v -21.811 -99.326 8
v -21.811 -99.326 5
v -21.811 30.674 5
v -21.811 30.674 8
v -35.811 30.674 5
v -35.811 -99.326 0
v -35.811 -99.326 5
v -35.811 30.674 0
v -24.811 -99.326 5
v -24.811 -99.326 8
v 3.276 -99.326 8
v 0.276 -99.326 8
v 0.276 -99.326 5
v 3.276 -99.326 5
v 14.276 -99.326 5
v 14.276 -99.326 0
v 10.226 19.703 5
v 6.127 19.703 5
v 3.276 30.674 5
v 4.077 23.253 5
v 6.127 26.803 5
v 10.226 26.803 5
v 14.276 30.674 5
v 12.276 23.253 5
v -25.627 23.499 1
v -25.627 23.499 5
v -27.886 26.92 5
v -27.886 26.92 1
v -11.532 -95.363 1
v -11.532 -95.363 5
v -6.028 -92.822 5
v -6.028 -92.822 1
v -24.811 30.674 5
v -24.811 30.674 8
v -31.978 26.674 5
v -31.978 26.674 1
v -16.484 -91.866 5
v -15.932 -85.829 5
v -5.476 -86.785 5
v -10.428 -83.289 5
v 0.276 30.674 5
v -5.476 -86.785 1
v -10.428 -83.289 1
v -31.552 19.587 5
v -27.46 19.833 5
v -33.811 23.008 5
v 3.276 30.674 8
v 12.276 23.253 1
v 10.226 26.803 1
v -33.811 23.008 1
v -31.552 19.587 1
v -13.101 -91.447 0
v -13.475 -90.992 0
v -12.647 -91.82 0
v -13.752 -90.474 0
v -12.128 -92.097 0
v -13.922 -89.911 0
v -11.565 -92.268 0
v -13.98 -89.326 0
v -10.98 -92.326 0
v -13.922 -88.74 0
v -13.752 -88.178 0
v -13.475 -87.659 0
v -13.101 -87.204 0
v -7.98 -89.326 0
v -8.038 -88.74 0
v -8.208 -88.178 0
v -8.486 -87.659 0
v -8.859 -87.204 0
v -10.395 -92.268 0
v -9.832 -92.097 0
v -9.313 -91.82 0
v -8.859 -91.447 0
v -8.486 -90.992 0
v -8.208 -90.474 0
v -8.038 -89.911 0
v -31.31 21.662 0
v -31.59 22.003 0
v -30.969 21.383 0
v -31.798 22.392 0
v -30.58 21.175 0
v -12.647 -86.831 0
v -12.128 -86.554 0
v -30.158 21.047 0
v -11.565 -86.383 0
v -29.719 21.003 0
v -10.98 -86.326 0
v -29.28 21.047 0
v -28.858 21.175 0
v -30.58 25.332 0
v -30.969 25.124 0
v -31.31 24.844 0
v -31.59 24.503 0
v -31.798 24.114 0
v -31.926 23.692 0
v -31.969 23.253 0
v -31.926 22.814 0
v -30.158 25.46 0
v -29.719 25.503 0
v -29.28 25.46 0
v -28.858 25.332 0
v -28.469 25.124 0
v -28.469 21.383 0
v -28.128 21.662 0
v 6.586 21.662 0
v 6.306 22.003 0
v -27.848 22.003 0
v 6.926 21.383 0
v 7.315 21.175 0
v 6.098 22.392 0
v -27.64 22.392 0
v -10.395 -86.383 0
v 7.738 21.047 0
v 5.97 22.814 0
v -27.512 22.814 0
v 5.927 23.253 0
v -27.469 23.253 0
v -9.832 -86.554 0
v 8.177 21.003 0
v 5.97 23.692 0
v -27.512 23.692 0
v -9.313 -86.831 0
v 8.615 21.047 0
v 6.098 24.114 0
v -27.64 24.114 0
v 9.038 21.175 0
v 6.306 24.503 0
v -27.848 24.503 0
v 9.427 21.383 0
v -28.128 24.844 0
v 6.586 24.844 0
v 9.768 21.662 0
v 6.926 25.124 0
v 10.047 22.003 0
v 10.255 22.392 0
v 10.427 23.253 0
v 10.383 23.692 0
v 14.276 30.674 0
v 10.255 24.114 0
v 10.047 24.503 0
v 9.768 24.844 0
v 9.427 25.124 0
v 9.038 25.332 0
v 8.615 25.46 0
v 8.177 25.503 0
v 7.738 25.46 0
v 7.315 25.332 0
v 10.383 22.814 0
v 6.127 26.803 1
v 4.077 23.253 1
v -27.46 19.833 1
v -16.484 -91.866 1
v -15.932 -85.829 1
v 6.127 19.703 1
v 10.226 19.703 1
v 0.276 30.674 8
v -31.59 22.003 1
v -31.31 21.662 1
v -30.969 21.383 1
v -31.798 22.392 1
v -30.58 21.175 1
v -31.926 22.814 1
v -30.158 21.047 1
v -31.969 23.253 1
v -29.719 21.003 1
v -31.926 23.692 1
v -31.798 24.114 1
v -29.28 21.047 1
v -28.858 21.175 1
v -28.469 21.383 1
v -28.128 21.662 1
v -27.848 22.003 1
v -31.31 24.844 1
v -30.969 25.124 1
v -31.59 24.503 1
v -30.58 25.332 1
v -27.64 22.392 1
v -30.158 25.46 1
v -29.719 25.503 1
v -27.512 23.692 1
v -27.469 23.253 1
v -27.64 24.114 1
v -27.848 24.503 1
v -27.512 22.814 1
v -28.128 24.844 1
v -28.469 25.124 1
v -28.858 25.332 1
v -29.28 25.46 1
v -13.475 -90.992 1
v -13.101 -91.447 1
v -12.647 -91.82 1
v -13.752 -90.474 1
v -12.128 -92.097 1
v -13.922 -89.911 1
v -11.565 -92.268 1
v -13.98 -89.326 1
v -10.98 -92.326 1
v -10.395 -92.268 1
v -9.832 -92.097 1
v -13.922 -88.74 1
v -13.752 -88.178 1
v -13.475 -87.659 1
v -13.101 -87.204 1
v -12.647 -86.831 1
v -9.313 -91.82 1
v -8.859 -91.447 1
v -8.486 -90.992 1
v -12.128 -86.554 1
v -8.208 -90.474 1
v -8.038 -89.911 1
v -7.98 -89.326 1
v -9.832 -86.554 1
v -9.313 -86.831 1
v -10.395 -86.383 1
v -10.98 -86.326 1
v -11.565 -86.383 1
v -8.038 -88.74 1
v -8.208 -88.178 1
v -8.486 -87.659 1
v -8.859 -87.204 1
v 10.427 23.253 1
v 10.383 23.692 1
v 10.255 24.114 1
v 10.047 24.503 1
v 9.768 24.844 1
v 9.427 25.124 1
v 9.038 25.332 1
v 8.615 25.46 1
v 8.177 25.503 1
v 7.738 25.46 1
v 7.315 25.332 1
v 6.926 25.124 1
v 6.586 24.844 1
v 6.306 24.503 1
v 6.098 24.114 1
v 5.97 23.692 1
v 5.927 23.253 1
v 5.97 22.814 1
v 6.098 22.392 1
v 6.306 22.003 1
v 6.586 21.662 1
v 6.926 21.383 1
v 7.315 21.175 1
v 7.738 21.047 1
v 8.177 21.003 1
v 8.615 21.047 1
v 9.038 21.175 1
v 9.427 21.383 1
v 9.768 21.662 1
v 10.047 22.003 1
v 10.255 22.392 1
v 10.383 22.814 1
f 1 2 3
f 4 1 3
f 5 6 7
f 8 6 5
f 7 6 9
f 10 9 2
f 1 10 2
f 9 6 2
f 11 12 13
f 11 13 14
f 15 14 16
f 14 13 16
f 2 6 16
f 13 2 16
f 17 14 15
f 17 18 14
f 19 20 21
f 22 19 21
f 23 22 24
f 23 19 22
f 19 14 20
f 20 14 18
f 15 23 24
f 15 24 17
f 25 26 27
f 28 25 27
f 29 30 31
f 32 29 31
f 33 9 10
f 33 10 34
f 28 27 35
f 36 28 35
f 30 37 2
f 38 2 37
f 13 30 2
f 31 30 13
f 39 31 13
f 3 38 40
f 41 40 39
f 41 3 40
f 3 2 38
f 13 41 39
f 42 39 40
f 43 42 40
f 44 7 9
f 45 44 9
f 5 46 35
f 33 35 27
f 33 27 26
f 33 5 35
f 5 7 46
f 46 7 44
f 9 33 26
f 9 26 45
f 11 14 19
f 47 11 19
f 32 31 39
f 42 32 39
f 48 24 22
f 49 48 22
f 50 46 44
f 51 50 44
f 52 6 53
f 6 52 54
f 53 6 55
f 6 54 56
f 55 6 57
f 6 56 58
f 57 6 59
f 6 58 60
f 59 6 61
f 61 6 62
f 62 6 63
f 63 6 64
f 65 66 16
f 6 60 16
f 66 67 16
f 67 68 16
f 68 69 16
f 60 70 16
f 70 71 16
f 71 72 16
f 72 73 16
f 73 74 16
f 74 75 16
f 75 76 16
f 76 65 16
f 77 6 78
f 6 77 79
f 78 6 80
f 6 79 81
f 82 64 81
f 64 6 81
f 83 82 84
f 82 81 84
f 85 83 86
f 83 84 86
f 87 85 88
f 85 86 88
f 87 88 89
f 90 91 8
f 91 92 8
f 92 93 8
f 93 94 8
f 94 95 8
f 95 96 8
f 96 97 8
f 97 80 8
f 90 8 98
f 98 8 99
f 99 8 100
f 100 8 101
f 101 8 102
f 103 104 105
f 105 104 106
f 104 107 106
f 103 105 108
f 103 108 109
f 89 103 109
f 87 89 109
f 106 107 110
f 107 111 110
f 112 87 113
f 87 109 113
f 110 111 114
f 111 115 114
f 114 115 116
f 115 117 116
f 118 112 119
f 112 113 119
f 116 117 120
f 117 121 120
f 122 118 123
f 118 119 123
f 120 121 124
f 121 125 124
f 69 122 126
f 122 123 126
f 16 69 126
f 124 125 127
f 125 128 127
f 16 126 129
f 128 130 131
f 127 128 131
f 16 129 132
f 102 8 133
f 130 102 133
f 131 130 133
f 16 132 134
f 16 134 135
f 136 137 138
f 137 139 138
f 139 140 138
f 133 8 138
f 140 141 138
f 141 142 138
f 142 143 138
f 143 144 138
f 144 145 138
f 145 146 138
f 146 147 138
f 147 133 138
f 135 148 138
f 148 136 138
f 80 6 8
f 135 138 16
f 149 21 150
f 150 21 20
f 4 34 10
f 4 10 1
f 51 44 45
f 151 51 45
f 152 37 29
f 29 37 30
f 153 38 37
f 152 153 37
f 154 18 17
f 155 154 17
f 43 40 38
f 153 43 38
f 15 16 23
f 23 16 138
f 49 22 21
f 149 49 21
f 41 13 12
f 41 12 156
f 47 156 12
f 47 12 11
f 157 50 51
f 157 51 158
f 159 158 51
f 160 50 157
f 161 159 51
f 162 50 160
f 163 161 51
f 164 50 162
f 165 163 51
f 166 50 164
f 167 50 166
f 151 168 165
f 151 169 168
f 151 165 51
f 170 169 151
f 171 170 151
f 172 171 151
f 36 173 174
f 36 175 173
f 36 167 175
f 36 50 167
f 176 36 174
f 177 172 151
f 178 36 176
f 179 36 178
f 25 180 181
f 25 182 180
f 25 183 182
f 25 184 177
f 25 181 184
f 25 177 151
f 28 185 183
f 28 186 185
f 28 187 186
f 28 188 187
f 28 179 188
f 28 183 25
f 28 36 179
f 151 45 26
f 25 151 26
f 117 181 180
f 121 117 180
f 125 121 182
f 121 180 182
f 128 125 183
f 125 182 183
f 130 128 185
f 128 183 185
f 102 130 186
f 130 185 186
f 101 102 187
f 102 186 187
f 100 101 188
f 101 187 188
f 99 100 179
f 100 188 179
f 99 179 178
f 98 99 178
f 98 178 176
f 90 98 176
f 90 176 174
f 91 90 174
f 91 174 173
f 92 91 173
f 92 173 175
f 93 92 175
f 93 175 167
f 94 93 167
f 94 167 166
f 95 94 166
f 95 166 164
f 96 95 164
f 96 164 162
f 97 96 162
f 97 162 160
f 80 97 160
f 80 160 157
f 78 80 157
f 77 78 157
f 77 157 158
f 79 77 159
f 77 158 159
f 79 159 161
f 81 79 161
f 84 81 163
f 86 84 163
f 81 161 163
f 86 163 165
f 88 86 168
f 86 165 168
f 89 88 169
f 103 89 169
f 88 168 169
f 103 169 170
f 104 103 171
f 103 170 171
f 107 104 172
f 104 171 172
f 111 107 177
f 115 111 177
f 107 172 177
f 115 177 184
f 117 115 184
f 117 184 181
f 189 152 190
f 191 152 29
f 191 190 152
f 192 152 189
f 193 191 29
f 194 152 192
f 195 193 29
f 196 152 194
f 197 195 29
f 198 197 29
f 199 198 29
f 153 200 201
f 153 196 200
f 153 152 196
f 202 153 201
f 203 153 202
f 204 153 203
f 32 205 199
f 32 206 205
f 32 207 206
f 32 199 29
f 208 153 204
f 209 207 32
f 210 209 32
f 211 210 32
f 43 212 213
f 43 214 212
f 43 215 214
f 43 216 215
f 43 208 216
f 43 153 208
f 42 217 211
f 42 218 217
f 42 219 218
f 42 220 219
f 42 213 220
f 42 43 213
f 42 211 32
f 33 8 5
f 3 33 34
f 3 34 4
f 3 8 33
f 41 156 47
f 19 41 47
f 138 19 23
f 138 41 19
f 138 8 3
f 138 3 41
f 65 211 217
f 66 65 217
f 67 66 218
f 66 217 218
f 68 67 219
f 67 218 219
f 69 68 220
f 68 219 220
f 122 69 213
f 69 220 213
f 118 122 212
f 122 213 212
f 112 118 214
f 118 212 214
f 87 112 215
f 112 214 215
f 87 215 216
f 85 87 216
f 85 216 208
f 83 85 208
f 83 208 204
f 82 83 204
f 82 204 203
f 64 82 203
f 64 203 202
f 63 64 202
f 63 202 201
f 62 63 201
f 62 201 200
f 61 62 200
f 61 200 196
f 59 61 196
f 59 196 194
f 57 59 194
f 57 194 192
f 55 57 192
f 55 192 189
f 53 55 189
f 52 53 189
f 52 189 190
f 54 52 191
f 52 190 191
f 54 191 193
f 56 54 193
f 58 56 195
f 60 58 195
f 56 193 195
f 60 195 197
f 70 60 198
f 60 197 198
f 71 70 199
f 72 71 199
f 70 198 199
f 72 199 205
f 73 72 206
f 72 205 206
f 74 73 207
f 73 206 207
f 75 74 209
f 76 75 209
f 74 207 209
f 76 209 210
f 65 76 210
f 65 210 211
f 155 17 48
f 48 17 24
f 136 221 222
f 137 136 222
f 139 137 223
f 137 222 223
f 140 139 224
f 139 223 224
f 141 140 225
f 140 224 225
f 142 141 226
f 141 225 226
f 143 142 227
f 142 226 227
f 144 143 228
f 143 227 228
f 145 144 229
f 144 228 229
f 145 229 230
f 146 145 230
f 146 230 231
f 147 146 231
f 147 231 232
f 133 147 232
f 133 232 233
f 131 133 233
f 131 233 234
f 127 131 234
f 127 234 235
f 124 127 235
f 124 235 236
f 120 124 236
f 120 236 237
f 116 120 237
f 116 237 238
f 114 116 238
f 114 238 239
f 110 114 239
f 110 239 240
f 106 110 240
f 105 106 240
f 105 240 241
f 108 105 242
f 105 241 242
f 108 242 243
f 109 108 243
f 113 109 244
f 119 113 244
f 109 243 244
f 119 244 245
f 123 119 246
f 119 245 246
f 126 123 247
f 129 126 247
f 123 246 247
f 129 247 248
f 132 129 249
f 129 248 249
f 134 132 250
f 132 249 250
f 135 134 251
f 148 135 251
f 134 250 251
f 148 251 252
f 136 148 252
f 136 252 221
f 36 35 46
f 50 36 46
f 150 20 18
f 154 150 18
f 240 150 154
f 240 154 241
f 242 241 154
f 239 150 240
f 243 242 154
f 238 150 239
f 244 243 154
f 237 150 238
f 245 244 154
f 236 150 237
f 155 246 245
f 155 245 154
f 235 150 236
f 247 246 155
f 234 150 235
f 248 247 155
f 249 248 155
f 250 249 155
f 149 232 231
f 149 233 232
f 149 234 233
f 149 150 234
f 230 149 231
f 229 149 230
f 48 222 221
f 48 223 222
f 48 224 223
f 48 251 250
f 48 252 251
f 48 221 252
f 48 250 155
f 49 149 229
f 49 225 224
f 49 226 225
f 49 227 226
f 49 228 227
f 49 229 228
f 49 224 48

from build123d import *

# Parameters (mm, degrees)
F0_W     = 50.08647
F0_H     = 130
F1_DEPTH = 5
F2_R     = 3
F2_R_2   = 2.25
F3_DEPTH = 25
F4_DEPTH = 4
F5_W     = 3
F5_H     = 130
F6_DEPTH = 3


with BuildPart() as f1:
    # F0 (on Top) → F1 (new body)
    with BuildSketch(Plane.XY):
        with Locations((-10.767537, -34.325769)):
            Rectangle(F0_W, F0_H)
    extrude(amount=F1_DEPTH)

    # F2 (on face) → F3 (cut)
    with BuildSketch(Plane.XY.offset(5)):
        with Locations((-10.980115, -89.325769)):
            Circle(F2_R)
        with Locations((8.176511, 23.25341)):
            Circle(F2_R_2)
        with Locations((-29.718949, 23.25341)):
            Circle(F2_R_2)
    extrude(amount=-F3_DEPTH, mode=Mode.SUBTRACT)

    # F2 (on face) → F4 (cut)
    with BuildSketch(Plane.XY.offset(5)):
        Polygon((10.226105, 26.80341), (6.126918, 26.80341), (4.077324, 23.25341), (6.126918, 19.70341), (10.226105, 19.70341), (12.275698, 23.25341), align=None)
        with Locations((8.176511, 23.25341)):
            Circle(F2_R_2, mode=Mode.SUBTRACT)
        Polygon((-31.977558, 26.674231), (-33.810772, 23.007808), (-31.552163, 19.586987), (-27.46034, 19.832589), (-25.627126, 23.499012), (-27.885736, 26.919834), align=None)
        with Locations((-29.718949, 23.25341)):
            Circle(F2_R_2, mode=Mode.SUBTRACT)
        Polygon((-10.428065, -83.288779), (-15.932276, -85.829184), (-16.484327, -91.866174), (-11.532166, -95.362758), (-6.027954, -92.822353), (-5.475904, -86.785364), align=None)
        with Locations((-10.980115, -89.325769)):
            Circle(F2_R, mode=Mode.SUBTRACT)
    extrude(amount=-F4_DEPTH, mode=Mode.SUBTRACT)

    # F5 (on face) → F6 (join)
    with BuildSketch(Plane.XY.offset(5)):
        with Locations((1.775698, -34.325769)):
            Rectangle(F5_W, F5_H)
        with Locations((-23.310772, -34.325769)):
            Rectangle(F5_W, F5_H)
    extrude(amount=F6_DEPTH)


solid = f1.part
